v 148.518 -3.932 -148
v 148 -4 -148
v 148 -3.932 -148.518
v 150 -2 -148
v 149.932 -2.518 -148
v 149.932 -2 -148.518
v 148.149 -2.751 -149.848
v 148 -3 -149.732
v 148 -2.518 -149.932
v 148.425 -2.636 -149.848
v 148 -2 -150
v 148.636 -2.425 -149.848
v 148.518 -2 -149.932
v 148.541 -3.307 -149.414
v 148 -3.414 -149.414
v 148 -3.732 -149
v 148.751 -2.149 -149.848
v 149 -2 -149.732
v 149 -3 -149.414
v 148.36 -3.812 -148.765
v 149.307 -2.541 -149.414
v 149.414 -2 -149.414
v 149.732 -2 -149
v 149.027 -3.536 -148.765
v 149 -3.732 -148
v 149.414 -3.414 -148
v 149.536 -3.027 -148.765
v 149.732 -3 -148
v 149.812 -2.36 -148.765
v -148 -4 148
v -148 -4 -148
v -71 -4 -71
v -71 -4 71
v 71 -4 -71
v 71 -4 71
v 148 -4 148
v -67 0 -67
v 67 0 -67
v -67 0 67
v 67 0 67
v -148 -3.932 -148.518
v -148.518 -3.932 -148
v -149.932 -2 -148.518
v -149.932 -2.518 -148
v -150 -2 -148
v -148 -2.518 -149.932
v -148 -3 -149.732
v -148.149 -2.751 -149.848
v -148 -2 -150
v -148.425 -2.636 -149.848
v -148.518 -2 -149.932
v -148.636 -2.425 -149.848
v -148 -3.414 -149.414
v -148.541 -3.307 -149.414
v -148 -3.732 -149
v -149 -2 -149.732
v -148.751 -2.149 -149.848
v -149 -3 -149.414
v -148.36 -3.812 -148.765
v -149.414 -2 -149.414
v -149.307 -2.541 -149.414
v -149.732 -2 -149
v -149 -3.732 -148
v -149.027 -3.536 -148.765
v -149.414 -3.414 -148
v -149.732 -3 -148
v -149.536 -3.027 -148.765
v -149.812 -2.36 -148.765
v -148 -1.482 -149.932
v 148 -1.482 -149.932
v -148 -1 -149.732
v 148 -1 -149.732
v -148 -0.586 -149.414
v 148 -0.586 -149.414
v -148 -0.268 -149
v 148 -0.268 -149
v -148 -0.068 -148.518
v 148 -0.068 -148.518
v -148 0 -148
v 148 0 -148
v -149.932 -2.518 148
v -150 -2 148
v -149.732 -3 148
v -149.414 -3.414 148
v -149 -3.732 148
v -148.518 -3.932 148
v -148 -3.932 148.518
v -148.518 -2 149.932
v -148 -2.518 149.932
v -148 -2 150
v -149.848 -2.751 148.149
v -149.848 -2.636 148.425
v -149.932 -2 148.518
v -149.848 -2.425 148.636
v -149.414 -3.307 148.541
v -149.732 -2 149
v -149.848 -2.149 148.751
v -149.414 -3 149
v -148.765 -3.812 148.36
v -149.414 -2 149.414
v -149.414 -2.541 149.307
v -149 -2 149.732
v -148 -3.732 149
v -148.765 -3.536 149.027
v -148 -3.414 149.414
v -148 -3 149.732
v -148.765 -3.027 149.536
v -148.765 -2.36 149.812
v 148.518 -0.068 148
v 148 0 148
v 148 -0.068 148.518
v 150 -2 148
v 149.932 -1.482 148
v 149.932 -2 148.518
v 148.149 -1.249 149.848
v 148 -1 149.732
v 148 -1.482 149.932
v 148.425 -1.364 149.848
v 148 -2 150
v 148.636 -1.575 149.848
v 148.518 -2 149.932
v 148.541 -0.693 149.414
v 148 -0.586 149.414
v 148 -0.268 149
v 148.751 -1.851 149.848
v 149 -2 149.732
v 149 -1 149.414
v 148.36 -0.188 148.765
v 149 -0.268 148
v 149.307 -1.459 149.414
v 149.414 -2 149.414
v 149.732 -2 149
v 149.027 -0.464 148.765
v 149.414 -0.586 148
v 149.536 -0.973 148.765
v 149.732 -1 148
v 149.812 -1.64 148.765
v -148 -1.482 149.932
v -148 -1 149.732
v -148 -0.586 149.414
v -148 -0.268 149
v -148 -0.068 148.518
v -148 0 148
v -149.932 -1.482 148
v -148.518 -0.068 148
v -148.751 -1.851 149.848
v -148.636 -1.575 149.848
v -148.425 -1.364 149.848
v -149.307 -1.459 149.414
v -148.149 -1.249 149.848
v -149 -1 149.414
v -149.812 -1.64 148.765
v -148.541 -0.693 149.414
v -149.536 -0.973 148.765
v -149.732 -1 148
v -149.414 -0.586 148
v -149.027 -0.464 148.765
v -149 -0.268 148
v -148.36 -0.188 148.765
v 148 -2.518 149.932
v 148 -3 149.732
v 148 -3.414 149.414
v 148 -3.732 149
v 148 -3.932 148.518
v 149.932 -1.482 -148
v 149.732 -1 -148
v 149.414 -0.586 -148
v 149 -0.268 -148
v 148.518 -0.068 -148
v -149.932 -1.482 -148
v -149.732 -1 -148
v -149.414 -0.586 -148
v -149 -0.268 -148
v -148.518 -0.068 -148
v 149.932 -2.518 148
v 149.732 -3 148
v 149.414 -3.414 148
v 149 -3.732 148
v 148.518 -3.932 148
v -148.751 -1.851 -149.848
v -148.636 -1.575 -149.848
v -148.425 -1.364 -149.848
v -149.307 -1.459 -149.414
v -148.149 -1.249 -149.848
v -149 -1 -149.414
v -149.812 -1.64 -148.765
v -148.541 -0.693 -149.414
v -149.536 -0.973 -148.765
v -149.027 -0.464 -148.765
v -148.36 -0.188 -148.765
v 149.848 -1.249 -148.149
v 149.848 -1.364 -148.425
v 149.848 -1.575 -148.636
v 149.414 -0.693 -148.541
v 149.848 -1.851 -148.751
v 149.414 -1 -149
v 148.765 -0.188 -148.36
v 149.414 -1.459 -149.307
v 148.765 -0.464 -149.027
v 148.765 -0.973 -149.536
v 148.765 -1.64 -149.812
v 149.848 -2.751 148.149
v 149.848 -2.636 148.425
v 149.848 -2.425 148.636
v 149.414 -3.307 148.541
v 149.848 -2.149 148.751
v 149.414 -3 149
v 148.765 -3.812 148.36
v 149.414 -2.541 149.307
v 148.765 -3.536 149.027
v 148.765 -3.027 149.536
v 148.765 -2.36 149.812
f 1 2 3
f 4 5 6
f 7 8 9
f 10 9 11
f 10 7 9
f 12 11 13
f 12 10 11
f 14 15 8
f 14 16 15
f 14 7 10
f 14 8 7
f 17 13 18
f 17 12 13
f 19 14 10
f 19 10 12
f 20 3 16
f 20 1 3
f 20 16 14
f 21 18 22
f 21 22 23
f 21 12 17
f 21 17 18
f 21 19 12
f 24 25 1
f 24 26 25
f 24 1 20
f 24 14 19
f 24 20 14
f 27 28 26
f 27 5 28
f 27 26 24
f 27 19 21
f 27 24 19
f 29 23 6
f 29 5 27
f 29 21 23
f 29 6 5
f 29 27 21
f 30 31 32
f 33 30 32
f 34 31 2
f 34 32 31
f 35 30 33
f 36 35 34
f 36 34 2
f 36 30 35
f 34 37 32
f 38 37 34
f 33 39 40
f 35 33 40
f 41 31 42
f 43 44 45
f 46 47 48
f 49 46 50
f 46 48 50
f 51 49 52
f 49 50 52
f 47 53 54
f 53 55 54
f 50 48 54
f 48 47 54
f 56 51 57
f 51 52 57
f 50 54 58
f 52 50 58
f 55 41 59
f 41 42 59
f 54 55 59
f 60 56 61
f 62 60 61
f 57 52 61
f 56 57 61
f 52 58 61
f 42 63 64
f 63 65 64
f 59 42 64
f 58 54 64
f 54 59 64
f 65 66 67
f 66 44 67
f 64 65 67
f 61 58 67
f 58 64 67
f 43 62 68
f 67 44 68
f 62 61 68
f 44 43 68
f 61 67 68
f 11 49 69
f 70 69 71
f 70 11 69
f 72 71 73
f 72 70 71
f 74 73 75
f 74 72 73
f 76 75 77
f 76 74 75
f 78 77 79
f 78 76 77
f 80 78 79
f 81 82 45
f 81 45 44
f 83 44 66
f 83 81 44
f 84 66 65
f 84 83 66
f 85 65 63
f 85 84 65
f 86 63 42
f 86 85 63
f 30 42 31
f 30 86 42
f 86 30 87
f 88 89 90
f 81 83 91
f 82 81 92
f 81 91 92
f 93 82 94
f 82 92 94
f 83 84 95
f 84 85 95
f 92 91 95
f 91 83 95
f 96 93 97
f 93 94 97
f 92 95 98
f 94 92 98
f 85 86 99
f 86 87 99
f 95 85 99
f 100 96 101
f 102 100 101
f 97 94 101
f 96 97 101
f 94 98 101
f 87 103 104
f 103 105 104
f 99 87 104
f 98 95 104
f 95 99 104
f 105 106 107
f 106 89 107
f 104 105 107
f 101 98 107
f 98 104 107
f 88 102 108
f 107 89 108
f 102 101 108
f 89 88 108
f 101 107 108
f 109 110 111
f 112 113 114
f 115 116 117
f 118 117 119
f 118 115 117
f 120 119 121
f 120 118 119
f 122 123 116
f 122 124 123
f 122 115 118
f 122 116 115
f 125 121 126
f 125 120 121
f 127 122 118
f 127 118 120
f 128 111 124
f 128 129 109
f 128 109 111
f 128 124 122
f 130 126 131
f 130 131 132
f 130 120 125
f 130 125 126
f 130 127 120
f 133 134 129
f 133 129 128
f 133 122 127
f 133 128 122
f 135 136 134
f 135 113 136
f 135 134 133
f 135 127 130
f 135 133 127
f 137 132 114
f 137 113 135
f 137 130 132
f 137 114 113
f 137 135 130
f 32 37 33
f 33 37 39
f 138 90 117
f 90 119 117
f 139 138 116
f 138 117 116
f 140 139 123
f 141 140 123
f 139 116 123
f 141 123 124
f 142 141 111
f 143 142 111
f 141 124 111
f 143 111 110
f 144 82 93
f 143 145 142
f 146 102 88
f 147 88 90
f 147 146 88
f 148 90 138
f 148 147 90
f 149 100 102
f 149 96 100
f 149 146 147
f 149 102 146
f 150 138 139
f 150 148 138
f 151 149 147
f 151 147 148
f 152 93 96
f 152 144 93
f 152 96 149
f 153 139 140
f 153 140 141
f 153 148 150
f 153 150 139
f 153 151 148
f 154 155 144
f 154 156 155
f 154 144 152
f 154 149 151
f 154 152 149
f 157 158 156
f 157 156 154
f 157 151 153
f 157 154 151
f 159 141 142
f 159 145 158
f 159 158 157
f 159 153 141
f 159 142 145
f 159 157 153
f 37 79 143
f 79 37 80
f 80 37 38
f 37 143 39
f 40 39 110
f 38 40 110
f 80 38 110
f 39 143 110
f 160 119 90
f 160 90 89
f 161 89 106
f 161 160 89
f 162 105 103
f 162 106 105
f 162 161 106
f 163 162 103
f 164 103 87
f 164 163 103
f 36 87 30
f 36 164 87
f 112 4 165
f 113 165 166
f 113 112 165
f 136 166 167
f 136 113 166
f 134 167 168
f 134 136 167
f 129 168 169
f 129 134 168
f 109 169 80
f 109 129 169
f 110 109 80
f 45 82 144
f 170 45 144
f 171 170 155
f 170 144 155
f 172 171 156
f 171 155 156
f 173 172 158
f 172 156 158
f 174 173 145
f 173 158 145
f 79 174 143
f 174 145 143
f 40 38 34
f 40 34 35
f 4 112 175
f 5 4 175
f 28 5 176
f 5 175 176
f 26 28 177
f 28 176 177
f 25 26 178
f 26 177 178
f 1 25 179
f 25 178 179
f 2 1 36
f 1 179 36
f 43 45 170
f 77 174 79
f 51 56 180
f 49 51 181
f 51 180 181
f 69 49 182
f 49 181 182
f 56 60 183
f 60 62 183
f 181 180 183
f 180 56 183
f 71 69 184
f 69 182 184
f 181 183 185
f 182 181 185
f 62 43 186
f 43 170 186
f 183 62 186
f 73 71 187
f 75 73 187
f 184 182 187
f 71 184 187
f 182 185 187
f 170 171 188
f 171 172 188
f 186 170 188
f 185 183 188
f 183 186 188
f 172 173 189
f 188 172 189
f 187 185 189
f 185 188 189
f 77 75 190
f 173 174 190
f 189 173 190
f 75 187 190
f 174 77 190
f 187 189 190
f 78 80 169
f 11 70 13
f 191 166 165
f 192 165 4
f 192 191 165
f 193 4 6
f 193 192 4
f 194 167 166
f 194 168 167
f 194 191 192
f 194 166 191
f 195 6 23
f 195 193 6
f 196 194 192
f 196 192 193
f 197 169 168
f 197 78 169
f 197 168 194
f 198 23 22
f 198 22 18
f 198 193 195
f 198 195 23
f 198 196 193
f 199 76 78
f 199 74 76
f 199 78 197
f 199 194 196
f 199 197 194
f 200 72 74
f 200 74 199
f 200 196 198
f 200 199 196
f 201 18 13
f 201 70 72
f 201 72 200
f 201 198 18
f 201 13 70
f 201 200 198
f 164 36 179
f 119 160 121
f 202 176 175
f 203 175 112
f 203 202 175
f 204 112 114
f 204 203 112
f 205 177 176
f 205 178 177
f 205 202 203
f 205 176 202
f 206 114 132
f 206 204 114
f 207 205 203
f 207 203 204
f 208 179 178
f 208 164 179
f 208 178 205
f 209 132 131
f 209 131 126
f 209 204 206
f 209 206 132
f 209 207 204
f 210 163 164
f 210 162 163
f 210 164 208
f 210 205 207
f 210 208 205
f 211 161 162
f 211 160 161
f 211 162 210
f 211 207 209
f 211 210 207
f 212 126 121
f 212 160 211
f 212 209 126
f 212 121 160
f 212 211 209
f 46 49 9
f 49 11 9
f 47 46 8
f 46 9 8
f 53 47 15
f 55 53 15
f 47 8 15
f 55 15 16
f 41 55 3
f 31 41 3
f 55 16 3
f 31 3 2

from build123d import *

# Parameters (mm, degrees)
F0_W     = 300
F0_H     = 300
F0_W_2   = 134
F0_H_2   = 134
F1_DEPTH = 4
F2_R     = 1.99999
F3_SIZE  = 3.99999


# Not quite as in the source:
# - a fillet or chamfer is up to 0.001 mm smaller than in the source, because OpenCascade refuses the exact size


with BuildPart() as f1:
    # F0 (on Front) → F1 (new body)
    with BuildSketch(Plane.XZ):
        Rectangle(F0_W, F0_H)
        Rectangle(F0_W_2, F0_H_2, mode=Mode.SUBTRACT)
    extrude(amount=F1_DEPTH)

    # F2 (radius 2 in the source; OpenCascade refuses exactly that, so slightly less here)
    f2_edges = [f1.edges().sort_by_distance(p)[0] for p in [
        (0, -4, 150),
        (-150, -4, 0),
        (150, -4, 0),
        (0, -4, -150),
        (-150, 0, 0),
        (-150, -2, 150),
        (-150, -2, -150),
        (0, 0, -150),
        (150, 0, 0),
        (0, 0, 150),
        (150, -2, 150),
        (150, -2, -150),
    ]]
    fillet(f2_edges, radius=F2_R)

    # F3 (size 4 in the source; OpenCascade refuses exactly that, so slightly less here)
    f3_edges = [f1.edges().sort_by_distance(p)[0] for p in [
        (0, -4, 67),
        (67, -4, 0),
        (0, -4, -67),
        (-67, -4, 0),
    ]]
    chamfer(f3_edges, length=F3_SIZE)


solid = f1.part
